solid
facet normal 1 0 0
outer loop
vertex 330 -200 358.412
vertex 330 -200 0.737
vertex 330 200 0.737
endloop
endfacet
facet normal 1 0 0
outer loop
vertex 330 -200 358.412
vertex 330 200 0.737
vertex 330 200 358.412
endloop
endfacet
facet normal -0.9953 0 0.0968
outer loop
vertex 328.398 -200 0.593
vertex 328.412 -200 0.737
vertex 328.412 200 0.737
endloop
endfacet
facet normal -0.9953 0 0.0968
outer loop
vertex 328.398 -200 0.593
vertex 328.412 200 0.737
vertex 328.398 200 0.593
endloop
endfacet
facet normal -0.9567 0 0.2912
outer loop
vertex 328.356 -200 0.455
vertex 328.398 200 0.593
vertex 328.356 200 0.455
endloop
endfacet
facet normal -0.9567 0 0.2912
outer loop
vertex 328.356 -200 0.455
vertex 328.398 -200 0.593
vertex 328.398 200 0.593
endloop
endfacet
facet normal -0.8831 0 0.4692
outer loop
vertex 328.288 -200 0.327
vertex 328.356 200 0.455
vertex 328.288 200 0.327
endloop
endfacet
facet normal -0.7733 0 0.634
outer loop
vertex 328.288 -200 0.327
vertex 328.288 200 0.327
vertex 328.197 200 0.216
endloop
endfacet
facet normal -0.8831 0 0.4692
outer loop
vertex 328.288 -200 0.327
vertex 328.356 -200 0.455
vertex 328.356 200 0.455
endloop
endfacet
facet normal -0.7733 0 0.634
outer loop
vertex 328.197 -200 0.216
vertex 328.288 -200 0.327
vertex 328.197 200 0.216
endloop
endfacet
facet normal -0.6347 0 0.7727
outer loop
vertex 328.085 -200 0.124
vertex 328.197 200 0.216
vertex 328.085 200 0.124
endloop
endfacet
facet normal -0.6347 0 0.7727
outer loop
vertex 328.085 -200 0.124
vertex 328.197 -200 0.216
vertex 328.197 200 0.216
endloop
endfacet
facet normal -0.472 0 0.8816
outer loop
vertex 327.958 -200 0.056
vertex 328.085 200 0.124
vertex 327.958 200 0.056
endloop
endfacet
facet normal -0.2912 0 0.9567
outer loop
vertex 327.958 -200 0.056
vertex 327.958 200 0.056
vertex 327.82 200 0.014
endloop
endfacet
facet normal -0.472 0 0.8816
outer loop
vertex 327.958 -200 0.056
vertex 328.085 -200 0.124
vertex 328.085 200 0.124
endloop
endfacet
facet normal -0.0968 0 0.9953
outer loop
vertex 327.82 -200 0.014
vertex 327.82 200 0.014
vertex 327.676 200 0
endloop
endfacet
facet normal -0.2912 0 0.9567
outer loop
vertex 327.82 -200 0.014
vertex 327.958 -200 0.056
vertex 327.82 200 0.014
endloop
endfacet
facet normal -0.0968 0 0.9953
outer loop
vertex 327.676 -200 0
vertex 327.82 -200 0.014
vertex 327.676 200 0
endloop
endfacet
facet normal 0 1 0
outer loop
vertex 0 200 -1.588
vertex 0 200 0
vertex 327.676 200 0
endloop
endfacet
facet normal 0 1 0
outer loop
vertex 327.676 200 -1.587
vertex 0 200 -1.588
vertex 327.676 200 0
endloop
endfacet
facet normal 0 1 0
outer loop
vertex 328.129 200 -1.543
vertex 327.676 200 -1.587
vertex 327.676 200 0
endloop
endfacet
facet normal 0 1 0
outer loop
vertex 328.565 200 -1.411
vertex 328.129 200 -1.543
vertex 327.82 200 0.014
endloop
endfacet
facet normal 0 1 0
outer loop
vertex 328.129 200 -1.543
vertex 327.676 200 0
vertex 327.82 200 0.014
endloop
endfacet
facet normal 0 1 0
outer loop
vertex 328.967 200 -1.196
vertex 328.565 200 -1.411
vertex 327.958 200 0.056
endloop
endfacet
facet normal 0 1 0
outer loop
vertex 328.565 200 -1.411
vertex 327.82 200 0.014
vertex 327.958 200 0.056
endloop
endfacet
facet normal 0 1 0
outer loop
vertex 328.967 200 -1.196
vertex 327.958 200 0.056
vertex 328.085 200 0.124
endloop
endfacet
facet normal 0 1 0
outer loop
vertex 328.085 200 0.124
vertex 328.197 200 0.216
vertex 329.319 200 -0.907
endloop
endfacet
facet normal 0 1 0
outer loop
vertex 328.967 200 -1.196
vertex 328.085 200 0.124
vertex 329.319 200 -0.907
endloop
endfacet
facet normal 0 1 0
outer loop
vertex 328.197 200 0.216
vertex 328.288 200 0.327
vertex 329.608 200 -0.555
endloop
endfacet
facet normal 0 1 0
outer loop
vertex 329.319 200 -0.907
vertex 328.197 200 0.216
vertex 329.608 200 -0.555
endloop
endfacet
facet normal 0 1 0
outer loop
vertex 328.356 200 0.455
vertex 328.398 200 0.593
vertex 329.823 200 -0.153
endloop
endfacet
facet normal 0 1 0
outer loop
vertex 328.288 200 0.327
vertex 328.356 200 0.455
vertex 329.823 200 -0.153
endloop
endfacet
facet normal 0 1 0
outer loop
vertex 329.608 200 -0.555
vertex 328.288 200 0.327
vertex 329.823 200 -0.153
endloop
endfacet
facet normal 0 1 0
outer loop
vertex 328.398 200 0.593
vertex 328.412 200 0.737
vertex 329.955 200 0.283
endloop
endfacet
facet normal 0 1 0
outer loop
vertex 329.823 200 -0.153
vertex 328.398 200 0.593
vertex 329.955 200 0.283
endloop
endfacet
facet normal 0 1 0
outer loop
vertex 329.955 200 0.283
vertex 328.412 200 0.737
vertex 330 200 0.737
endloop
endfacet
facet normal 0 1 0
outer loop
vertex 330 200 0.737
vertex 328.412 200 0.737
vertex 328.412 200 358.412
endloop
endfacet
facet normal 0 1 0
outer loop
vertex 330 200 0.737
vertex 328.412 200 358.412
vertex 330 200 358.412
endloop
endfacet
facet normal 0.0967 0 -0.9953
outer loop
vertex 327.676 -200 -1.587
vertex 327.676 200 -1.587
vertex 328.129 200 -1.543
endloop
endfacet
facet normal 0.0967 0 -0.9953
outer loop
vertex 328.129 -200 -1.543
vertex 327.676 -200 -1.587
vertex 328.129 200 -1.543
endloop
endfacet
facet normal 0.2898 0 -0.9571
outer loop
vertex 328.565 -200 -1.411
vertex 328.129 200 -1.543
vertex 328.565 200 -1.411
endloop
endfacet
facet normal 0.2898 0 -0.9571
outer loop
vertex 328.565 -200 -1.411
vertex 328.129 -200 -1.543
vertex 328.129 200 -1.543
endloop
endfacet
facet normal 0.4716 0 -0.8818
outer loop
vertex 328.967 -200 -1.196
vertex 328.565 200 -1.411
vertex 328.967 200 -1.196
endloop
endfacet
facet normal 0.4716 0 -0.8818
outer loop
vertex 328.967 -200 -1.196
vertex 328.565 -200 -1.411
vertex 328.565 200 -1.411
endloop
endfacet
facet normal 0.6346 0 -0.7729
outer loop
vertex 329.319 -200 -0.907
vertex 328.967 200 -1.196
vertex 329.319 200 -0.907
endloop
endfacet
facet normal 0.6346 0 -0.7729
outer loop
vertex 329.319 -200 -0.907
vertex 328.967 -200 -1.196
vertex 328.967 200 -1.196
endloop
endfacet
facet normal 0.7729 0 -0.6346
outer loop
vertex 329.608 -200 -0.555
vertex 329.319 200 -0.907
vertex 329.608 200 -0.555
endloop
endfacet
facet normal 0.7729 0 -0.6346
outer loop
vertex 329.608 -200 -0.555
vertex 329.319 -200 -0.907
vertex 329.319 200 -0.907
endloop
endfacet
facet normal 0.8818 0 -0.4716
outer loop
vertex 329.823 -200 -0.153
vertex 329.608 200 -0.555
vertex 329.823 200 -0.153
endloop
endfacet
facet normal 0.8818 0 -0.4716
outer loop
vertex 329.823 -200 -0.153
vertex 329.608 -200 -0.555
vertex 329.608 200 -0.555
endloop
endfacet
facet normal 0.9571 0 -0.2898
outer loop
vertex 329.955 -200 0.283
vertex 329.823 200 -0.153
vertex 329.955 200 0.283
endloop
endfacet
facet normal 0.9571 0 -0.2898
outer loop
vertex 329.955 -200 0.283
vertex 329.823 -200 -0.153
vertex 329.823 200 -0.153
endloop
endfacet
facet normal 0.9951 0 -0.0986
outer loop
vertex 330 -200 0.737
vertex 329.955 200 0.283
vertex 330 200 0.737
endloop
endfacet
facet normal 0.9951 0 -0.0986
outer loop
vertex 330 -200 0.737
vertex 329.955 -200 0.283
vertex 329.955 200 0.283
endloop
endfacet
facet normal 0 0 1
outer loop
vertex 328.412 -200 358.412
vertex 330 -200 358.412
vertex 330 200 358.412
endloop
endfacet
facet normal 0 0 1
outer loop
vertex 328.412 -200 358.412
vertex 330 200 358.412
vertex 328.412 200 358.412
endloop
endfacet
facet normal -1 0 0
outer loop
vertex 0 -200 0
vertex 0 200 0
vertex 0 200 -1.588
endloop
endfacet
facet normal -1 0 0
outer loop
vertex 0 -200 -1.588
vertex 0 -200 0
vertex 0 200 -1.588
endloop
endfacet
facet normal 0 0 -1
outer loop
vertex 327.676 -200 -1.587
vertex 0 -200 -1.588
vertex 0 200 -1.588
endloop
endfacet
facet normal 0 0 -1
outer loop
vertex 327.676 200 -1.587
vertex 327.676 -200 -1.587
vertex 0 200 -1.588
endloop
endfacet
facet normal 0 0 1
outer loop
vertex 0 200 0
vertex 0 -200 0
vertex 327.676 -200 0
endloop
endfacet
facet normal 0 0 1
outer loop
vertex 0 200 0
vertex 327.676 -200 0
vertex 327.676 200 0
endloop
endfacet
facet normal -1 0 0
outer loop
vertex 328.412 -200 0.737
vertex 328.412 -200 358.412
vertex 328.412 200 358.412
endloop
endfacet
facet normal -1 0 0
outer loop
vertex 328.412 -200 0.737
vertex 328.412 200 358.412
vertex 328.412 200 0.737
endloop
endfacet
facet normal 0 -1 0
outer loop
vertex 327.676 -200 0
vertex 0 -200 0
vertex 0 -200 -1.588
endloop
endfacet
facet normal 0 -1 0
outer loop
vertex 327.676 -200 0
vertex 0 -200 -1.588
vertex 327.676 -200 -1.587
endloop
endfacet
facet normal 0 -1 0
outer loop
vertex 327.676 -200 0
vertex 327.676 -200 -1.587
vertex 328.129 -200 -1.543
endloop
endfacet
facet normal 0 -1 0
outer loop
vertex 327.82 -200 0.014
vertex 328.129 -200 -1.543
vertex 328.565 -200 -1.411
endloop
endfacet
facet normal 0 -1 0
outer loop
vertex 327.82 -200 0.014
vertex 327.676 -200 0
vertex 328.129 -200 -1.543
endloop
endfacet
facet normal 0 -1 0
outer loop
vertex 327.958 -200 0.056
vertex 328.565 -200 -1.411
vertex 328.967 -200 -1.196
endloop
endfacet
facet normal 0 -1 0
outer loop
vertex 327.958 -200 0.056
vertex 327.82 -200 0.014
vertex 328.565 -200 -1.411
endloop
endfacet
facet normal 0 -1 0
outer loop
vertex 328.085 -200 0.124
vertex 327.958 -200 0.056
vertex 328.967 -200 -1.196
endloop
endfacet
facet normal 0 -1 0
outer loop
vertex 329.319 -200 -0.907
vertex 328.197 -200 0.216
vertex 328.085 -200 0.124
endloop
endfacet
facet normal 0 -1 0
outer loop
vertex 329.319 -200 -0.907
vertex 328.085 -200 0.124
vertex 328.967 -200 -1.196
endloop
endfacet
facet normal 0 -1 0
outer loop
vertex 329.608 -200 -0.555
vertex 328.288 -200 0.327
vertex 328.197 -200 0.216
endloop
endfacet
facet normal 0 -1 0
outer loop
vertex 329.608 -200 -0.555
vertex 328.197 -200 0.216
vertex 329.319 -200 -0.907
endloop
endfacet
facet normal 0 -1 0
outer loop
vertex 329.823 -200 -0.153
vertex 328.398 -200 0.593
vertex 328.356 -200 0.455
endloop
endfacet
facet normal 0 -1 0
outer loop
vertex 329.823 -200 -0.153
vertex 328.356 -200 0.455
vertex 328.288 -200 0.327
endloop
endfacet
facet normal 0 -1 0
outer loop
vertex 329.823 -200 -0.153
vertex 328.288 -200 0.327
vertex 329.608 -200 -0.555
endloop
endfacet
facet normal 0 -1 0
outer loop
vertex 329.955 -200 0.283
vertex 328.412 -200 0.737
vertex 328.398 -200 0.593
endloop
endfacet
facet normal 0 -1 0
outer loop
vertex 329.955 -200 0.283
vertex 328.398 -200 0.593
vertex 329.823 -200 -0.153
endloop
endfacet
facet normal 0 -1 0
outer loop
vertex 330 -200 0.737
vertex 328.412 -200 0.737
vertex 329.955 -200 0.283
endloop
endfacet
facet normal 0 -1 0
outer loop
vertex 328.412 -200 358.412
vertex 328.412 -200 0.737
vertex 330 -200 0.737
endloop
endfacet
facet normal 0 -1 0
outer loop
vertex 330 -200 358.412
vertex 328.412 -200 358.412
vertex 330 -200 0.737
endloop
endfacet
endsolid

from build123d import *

# Parameters (mm, degrees)
SKETCH1_W                    = 1.5875
SKETCH1_H                    = 400
BASE_FLANGE1_DEPTH           = 330
EDGE_FLANGE1_STRIP_W         = 7.8232
EDGE_FLANGE1_STRIP_H         = 1.5875
EDGE_FLANGE1_STRIP_CUT_DEPTH = 400
EDGE_FLANGE1_DEPTH           = 400


# Sheet-metal steps are written as plain solids
with BuildPart() as part:
    # Sketch1 → Base-Flange1 (new body)
    with BuildSketch(Plane(origin=(0, 0, 0), x_dir=(0, 0, -1), z_dir=(1, 0, 0))):
        with Locations((0.79375, 0)):
            Rectangle(SKETCH1_W, SKETCH1_H)
    extrude(amount=BASE_FLANGE1_DEPTH)

    # Edge-Flange1 strip (across the edge) → Edge-Flange1 strip cut (cut)
    with BuildSketch(Plane(origin=(330, -200, 0), x_dir=(-1, 0, 0), z_dir=(0, 1, 0))):
        with Locations((-1.5875, -0.79375)):
            Rectangle(EDGE_FLANGE1_STRIP_W, EDGE_FLANGE1_STRIP_H)
    extrude(amount=EDGE_FLANGE1_STRIP_CUT_DEPTH, mode=Mode.SUBTRACT)

    # Edge-Flange1 section (across the edge) → Edge-Flange1 (add)
    with BuildSketch(Plane(origin=(330, -200, 0), x_dir=(-1, 0, 0), z_dir=(0, 1, 0))):
        with BuildLine():
            Line((0, 0.7366), (0, 358.4125))
            Line((0, 358.4125), (1.5875, 358.4125))
            Line((1.5875, 358.4125), (1.5875, 0.7366))
            ThreePointArc((1.5875, 0.7366), (1.803245145, 0.215745145), (2.3241, 0))
            Line((2.3241, 0), (2.3241, -1.5875))
            ThreePointArc((2.3241, -1.5875), (0.68071313, -0.90678687), (0, 0.7366))
        make_face()
    extrude(amount=EDGE_FLANGE1_DEPTH)


solid = part.part
